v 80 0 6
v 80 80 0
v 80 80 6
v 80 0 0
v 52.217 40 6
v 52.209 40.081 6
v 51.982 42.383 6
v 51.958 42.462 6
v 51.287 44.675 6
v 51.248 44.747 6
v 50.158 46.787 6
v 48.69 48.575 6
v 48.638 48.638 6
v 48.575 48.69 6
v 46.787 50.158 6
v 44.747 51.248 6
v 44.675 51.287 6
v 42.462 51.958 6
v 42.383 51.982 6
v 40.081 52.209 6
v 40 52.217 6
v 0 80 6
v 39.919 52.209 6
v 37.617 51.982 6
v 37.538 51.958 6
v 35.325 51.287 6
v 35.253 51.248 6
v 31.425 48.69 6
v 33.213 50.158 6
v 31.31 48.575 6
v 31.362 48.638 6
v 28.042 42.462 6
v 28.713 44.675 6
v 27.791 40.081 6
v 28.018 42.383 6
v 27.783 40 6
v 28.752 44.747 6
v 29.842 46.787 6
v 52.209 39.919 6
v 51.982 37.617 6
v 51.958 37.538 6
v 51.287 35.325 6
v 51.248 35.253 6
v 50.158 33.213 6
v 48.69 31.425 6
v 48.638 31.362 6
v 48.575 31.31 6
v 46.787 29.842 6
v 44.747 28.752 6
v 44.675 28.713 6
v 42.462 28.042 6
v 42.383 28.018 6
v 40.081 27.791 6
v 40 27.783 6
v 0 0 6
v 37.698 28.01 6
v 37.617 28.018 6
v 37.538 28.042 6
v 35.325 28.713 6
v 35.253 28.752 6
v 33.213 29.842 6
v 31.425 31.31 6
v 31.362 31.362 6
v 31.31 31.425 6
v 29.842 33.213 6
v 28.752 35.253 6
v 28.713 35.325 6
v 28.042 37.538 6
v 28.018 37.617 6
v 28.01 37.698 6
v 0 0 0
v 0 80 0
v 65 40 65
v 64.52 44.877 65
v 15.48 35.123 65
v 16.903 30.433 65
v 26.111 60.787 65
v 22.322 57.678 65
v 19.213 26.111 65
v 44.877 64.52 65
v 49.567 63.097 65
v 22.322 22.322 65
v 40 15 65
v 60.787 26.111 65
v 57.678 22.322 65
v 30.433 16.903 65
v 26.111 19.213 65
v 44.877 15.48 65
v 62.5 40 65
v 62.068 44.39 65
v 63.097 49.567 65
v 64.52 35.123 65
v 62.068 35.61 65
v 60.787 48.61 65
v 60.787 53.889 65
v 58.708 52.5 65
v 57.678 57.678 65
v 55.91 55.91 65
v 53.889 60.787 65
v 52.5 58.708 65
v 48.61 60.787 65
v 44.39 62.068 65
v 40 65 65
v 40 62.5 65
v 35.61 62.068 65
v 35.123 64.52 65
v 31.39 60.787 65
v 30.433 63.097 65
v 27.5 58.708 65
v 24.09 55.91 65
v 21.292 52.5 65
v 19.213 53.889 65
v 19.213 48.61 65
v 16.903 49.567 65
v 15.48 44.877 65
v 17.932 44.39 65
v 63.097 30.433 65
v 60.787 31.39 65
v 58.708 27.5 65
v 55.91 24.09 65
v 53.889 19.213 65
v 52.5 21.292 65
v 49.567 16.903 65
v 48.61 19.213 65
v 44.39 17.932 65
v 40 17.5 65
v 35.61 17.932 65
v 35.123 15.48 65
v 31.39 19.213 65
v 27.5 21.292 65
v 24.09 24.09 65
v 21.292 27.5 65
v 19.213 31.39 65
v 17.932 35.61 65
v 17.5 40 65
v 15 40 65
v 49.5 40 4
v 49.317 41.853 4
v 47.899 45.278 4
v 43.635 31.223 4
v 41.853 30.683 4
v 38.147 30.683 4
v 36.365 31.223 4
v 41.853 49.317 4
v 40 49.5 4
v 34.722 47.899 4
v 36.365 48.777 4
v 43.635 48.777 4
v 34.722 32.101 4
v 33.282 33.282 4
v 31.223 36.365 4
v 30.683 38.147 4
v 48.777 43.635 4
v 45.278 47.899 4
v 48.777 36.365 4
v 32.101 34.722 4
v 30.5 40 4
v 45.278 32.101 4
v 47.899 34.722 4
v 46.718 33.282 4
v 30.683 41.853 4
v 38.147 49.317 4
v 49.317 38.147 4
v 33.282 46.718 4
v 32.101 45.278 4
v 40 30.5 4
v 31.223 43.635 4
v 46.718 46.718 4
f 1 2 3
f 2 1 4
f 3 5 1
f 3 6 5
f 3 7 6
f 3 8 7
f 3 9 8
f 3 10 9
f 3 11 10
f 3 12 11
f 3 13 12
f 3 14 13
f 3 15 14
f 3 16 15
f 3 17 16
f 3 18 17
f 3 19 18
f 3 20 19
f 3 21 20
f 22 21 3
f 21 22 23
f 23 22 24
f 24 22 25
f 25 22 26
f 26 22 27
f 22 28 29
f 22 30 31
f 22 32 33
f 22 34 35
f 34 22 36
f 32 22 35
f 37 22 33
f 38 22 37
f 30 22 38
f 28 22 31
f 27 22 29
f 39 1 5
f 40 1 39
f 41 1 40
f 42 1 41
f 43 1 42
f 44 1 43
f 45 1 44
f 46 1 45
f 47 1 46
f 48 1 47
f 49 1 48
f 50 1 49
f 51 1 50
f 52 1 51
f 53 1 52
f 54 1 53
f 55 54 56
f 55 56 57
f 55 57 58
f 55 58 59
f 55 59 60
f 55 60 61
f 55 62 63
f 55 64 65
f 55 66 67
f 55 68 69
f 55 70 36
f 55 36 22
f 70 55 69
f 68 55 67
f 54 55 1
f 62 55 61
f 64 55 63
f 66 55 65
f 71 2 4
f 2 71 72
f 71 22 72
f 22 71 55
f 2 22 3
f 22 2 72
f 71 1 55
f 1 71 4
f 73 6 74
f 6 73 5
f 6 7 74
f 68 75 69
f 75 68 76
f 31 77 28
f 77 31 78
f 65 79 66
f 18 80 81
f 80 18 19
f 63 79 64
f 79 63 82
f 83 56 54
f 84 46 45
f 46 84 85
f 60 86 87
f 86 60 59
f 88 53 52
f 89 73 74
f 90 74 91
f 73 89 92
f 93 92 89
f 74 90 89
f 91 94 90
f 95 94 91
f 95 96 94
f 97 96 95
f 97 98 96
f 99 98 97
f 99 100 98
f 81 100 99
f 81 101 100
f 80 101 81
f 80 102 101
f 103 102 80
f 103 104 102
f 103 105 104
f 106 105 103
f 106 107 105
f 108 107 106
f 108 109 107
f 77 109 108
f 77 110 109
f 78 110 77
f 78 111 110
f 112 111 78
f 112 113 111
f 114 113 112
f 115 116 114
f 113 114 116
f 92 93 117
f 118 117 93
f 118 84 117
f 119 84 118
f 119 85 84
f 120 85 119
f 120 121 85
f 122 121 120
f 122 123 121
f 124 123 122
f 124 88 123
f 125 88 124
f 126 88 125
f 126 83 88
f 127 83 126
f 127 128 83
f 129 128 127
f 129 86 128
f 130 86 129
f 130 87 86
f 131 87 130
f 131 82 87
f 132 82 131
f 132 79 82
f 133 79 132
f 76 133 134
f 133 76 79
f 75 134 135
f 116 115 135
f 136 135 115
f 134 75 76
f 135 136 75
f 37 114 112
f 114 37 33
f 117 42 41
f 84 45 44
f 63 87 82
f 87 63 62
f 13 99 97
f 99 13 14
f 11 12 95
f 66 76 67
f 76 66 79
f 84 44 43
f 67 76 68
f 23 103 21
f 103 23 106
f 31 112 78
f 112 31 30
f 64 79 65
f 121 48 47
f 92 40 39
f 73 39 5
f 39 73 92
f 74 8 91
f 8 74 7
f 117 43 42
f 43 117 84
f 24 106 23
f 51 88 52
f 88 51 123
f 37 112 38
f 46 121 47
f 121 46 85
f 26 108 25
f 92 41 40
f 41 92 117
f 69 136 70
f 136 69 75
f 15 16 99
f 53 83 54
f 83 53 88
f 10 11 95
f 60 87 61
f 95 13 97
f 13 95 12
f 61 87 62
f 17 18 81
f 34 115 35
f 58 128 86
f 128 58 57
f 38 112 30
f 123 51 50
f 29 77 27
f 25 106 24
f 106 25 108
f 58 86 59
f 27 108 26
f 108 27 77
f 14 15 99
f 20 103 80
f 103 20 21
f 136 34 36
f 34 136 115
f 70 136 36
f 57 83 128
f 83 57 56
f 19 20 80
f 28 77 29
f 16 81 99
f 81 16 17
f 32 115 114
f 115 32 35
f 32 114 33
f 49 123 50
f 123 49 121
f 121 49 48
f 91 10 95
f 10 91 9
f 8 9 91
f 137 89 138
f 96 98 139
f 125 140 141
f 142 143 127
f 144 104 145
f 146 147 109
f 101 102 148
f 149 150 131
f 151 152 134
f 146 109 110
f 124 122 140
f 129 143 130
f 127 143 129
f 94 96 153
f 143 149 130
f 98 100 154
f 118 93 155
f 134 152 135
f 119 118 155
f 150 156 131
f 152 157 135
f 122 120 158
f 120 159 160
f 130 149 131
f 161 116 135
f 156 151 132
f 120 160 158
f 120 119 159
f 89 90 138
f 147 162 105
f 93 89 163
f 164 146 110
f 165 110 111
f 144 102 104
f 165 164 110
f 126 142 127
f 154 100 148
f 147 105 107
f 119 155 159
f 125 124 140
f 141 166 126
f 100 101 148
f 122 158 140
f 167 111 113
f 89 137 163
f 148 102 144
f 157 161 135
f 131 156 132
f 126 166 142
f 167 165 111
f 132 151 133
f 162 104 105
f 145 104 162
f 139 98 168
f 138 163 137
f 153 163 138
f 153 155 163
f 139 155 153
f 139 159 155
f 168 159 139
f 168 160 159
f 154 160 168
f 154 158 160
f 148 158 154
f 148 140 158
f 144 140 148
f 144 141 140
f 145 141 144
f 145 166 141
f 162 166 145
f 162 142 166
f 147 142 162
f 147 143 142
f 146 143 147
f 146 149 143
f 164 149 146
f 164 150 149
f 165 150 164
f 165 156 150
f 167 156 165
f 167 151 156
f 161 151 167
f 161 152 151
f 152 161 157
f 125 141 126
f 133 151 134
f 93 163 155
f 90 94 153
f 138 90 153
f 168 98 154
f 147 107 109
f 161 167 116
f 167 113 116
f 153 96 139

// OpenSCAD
$fn = 32;

// ----------------------------------------------------------------------
// Hopper: funnel with square flange
// ----------------------------------------------------------------------

// --- parameters (mm) ---
fl = 80;                  // flange side, X and Y
fl_t = 6;                 // flange thickness
cone_h = 60;              // cone height above the flange
top_d = 50;               // cone mouth diameter
bot_d = 24;               // cone spout diameter
wall = 2.5;               // cone wall thickness

bore_d = bot_d - 2 * wall;  // spout bore diameter
total_h = fl_t + cone_h - 1;  // overall height

difference() {
  union() {
    cube([fl, fl, fl_t]);
    translate([fl / 2, fl / 2, fl_t - 1])
      cylinder(h = cone_h, d1 = bot_d, d2 = top_d);
  }
  translate([fl / 2, fl / 2, fl_t - 2])
    cylinder(h = cone_h + 1, d1 = bore_d, d2 = top_d - 2 * wall);
}
